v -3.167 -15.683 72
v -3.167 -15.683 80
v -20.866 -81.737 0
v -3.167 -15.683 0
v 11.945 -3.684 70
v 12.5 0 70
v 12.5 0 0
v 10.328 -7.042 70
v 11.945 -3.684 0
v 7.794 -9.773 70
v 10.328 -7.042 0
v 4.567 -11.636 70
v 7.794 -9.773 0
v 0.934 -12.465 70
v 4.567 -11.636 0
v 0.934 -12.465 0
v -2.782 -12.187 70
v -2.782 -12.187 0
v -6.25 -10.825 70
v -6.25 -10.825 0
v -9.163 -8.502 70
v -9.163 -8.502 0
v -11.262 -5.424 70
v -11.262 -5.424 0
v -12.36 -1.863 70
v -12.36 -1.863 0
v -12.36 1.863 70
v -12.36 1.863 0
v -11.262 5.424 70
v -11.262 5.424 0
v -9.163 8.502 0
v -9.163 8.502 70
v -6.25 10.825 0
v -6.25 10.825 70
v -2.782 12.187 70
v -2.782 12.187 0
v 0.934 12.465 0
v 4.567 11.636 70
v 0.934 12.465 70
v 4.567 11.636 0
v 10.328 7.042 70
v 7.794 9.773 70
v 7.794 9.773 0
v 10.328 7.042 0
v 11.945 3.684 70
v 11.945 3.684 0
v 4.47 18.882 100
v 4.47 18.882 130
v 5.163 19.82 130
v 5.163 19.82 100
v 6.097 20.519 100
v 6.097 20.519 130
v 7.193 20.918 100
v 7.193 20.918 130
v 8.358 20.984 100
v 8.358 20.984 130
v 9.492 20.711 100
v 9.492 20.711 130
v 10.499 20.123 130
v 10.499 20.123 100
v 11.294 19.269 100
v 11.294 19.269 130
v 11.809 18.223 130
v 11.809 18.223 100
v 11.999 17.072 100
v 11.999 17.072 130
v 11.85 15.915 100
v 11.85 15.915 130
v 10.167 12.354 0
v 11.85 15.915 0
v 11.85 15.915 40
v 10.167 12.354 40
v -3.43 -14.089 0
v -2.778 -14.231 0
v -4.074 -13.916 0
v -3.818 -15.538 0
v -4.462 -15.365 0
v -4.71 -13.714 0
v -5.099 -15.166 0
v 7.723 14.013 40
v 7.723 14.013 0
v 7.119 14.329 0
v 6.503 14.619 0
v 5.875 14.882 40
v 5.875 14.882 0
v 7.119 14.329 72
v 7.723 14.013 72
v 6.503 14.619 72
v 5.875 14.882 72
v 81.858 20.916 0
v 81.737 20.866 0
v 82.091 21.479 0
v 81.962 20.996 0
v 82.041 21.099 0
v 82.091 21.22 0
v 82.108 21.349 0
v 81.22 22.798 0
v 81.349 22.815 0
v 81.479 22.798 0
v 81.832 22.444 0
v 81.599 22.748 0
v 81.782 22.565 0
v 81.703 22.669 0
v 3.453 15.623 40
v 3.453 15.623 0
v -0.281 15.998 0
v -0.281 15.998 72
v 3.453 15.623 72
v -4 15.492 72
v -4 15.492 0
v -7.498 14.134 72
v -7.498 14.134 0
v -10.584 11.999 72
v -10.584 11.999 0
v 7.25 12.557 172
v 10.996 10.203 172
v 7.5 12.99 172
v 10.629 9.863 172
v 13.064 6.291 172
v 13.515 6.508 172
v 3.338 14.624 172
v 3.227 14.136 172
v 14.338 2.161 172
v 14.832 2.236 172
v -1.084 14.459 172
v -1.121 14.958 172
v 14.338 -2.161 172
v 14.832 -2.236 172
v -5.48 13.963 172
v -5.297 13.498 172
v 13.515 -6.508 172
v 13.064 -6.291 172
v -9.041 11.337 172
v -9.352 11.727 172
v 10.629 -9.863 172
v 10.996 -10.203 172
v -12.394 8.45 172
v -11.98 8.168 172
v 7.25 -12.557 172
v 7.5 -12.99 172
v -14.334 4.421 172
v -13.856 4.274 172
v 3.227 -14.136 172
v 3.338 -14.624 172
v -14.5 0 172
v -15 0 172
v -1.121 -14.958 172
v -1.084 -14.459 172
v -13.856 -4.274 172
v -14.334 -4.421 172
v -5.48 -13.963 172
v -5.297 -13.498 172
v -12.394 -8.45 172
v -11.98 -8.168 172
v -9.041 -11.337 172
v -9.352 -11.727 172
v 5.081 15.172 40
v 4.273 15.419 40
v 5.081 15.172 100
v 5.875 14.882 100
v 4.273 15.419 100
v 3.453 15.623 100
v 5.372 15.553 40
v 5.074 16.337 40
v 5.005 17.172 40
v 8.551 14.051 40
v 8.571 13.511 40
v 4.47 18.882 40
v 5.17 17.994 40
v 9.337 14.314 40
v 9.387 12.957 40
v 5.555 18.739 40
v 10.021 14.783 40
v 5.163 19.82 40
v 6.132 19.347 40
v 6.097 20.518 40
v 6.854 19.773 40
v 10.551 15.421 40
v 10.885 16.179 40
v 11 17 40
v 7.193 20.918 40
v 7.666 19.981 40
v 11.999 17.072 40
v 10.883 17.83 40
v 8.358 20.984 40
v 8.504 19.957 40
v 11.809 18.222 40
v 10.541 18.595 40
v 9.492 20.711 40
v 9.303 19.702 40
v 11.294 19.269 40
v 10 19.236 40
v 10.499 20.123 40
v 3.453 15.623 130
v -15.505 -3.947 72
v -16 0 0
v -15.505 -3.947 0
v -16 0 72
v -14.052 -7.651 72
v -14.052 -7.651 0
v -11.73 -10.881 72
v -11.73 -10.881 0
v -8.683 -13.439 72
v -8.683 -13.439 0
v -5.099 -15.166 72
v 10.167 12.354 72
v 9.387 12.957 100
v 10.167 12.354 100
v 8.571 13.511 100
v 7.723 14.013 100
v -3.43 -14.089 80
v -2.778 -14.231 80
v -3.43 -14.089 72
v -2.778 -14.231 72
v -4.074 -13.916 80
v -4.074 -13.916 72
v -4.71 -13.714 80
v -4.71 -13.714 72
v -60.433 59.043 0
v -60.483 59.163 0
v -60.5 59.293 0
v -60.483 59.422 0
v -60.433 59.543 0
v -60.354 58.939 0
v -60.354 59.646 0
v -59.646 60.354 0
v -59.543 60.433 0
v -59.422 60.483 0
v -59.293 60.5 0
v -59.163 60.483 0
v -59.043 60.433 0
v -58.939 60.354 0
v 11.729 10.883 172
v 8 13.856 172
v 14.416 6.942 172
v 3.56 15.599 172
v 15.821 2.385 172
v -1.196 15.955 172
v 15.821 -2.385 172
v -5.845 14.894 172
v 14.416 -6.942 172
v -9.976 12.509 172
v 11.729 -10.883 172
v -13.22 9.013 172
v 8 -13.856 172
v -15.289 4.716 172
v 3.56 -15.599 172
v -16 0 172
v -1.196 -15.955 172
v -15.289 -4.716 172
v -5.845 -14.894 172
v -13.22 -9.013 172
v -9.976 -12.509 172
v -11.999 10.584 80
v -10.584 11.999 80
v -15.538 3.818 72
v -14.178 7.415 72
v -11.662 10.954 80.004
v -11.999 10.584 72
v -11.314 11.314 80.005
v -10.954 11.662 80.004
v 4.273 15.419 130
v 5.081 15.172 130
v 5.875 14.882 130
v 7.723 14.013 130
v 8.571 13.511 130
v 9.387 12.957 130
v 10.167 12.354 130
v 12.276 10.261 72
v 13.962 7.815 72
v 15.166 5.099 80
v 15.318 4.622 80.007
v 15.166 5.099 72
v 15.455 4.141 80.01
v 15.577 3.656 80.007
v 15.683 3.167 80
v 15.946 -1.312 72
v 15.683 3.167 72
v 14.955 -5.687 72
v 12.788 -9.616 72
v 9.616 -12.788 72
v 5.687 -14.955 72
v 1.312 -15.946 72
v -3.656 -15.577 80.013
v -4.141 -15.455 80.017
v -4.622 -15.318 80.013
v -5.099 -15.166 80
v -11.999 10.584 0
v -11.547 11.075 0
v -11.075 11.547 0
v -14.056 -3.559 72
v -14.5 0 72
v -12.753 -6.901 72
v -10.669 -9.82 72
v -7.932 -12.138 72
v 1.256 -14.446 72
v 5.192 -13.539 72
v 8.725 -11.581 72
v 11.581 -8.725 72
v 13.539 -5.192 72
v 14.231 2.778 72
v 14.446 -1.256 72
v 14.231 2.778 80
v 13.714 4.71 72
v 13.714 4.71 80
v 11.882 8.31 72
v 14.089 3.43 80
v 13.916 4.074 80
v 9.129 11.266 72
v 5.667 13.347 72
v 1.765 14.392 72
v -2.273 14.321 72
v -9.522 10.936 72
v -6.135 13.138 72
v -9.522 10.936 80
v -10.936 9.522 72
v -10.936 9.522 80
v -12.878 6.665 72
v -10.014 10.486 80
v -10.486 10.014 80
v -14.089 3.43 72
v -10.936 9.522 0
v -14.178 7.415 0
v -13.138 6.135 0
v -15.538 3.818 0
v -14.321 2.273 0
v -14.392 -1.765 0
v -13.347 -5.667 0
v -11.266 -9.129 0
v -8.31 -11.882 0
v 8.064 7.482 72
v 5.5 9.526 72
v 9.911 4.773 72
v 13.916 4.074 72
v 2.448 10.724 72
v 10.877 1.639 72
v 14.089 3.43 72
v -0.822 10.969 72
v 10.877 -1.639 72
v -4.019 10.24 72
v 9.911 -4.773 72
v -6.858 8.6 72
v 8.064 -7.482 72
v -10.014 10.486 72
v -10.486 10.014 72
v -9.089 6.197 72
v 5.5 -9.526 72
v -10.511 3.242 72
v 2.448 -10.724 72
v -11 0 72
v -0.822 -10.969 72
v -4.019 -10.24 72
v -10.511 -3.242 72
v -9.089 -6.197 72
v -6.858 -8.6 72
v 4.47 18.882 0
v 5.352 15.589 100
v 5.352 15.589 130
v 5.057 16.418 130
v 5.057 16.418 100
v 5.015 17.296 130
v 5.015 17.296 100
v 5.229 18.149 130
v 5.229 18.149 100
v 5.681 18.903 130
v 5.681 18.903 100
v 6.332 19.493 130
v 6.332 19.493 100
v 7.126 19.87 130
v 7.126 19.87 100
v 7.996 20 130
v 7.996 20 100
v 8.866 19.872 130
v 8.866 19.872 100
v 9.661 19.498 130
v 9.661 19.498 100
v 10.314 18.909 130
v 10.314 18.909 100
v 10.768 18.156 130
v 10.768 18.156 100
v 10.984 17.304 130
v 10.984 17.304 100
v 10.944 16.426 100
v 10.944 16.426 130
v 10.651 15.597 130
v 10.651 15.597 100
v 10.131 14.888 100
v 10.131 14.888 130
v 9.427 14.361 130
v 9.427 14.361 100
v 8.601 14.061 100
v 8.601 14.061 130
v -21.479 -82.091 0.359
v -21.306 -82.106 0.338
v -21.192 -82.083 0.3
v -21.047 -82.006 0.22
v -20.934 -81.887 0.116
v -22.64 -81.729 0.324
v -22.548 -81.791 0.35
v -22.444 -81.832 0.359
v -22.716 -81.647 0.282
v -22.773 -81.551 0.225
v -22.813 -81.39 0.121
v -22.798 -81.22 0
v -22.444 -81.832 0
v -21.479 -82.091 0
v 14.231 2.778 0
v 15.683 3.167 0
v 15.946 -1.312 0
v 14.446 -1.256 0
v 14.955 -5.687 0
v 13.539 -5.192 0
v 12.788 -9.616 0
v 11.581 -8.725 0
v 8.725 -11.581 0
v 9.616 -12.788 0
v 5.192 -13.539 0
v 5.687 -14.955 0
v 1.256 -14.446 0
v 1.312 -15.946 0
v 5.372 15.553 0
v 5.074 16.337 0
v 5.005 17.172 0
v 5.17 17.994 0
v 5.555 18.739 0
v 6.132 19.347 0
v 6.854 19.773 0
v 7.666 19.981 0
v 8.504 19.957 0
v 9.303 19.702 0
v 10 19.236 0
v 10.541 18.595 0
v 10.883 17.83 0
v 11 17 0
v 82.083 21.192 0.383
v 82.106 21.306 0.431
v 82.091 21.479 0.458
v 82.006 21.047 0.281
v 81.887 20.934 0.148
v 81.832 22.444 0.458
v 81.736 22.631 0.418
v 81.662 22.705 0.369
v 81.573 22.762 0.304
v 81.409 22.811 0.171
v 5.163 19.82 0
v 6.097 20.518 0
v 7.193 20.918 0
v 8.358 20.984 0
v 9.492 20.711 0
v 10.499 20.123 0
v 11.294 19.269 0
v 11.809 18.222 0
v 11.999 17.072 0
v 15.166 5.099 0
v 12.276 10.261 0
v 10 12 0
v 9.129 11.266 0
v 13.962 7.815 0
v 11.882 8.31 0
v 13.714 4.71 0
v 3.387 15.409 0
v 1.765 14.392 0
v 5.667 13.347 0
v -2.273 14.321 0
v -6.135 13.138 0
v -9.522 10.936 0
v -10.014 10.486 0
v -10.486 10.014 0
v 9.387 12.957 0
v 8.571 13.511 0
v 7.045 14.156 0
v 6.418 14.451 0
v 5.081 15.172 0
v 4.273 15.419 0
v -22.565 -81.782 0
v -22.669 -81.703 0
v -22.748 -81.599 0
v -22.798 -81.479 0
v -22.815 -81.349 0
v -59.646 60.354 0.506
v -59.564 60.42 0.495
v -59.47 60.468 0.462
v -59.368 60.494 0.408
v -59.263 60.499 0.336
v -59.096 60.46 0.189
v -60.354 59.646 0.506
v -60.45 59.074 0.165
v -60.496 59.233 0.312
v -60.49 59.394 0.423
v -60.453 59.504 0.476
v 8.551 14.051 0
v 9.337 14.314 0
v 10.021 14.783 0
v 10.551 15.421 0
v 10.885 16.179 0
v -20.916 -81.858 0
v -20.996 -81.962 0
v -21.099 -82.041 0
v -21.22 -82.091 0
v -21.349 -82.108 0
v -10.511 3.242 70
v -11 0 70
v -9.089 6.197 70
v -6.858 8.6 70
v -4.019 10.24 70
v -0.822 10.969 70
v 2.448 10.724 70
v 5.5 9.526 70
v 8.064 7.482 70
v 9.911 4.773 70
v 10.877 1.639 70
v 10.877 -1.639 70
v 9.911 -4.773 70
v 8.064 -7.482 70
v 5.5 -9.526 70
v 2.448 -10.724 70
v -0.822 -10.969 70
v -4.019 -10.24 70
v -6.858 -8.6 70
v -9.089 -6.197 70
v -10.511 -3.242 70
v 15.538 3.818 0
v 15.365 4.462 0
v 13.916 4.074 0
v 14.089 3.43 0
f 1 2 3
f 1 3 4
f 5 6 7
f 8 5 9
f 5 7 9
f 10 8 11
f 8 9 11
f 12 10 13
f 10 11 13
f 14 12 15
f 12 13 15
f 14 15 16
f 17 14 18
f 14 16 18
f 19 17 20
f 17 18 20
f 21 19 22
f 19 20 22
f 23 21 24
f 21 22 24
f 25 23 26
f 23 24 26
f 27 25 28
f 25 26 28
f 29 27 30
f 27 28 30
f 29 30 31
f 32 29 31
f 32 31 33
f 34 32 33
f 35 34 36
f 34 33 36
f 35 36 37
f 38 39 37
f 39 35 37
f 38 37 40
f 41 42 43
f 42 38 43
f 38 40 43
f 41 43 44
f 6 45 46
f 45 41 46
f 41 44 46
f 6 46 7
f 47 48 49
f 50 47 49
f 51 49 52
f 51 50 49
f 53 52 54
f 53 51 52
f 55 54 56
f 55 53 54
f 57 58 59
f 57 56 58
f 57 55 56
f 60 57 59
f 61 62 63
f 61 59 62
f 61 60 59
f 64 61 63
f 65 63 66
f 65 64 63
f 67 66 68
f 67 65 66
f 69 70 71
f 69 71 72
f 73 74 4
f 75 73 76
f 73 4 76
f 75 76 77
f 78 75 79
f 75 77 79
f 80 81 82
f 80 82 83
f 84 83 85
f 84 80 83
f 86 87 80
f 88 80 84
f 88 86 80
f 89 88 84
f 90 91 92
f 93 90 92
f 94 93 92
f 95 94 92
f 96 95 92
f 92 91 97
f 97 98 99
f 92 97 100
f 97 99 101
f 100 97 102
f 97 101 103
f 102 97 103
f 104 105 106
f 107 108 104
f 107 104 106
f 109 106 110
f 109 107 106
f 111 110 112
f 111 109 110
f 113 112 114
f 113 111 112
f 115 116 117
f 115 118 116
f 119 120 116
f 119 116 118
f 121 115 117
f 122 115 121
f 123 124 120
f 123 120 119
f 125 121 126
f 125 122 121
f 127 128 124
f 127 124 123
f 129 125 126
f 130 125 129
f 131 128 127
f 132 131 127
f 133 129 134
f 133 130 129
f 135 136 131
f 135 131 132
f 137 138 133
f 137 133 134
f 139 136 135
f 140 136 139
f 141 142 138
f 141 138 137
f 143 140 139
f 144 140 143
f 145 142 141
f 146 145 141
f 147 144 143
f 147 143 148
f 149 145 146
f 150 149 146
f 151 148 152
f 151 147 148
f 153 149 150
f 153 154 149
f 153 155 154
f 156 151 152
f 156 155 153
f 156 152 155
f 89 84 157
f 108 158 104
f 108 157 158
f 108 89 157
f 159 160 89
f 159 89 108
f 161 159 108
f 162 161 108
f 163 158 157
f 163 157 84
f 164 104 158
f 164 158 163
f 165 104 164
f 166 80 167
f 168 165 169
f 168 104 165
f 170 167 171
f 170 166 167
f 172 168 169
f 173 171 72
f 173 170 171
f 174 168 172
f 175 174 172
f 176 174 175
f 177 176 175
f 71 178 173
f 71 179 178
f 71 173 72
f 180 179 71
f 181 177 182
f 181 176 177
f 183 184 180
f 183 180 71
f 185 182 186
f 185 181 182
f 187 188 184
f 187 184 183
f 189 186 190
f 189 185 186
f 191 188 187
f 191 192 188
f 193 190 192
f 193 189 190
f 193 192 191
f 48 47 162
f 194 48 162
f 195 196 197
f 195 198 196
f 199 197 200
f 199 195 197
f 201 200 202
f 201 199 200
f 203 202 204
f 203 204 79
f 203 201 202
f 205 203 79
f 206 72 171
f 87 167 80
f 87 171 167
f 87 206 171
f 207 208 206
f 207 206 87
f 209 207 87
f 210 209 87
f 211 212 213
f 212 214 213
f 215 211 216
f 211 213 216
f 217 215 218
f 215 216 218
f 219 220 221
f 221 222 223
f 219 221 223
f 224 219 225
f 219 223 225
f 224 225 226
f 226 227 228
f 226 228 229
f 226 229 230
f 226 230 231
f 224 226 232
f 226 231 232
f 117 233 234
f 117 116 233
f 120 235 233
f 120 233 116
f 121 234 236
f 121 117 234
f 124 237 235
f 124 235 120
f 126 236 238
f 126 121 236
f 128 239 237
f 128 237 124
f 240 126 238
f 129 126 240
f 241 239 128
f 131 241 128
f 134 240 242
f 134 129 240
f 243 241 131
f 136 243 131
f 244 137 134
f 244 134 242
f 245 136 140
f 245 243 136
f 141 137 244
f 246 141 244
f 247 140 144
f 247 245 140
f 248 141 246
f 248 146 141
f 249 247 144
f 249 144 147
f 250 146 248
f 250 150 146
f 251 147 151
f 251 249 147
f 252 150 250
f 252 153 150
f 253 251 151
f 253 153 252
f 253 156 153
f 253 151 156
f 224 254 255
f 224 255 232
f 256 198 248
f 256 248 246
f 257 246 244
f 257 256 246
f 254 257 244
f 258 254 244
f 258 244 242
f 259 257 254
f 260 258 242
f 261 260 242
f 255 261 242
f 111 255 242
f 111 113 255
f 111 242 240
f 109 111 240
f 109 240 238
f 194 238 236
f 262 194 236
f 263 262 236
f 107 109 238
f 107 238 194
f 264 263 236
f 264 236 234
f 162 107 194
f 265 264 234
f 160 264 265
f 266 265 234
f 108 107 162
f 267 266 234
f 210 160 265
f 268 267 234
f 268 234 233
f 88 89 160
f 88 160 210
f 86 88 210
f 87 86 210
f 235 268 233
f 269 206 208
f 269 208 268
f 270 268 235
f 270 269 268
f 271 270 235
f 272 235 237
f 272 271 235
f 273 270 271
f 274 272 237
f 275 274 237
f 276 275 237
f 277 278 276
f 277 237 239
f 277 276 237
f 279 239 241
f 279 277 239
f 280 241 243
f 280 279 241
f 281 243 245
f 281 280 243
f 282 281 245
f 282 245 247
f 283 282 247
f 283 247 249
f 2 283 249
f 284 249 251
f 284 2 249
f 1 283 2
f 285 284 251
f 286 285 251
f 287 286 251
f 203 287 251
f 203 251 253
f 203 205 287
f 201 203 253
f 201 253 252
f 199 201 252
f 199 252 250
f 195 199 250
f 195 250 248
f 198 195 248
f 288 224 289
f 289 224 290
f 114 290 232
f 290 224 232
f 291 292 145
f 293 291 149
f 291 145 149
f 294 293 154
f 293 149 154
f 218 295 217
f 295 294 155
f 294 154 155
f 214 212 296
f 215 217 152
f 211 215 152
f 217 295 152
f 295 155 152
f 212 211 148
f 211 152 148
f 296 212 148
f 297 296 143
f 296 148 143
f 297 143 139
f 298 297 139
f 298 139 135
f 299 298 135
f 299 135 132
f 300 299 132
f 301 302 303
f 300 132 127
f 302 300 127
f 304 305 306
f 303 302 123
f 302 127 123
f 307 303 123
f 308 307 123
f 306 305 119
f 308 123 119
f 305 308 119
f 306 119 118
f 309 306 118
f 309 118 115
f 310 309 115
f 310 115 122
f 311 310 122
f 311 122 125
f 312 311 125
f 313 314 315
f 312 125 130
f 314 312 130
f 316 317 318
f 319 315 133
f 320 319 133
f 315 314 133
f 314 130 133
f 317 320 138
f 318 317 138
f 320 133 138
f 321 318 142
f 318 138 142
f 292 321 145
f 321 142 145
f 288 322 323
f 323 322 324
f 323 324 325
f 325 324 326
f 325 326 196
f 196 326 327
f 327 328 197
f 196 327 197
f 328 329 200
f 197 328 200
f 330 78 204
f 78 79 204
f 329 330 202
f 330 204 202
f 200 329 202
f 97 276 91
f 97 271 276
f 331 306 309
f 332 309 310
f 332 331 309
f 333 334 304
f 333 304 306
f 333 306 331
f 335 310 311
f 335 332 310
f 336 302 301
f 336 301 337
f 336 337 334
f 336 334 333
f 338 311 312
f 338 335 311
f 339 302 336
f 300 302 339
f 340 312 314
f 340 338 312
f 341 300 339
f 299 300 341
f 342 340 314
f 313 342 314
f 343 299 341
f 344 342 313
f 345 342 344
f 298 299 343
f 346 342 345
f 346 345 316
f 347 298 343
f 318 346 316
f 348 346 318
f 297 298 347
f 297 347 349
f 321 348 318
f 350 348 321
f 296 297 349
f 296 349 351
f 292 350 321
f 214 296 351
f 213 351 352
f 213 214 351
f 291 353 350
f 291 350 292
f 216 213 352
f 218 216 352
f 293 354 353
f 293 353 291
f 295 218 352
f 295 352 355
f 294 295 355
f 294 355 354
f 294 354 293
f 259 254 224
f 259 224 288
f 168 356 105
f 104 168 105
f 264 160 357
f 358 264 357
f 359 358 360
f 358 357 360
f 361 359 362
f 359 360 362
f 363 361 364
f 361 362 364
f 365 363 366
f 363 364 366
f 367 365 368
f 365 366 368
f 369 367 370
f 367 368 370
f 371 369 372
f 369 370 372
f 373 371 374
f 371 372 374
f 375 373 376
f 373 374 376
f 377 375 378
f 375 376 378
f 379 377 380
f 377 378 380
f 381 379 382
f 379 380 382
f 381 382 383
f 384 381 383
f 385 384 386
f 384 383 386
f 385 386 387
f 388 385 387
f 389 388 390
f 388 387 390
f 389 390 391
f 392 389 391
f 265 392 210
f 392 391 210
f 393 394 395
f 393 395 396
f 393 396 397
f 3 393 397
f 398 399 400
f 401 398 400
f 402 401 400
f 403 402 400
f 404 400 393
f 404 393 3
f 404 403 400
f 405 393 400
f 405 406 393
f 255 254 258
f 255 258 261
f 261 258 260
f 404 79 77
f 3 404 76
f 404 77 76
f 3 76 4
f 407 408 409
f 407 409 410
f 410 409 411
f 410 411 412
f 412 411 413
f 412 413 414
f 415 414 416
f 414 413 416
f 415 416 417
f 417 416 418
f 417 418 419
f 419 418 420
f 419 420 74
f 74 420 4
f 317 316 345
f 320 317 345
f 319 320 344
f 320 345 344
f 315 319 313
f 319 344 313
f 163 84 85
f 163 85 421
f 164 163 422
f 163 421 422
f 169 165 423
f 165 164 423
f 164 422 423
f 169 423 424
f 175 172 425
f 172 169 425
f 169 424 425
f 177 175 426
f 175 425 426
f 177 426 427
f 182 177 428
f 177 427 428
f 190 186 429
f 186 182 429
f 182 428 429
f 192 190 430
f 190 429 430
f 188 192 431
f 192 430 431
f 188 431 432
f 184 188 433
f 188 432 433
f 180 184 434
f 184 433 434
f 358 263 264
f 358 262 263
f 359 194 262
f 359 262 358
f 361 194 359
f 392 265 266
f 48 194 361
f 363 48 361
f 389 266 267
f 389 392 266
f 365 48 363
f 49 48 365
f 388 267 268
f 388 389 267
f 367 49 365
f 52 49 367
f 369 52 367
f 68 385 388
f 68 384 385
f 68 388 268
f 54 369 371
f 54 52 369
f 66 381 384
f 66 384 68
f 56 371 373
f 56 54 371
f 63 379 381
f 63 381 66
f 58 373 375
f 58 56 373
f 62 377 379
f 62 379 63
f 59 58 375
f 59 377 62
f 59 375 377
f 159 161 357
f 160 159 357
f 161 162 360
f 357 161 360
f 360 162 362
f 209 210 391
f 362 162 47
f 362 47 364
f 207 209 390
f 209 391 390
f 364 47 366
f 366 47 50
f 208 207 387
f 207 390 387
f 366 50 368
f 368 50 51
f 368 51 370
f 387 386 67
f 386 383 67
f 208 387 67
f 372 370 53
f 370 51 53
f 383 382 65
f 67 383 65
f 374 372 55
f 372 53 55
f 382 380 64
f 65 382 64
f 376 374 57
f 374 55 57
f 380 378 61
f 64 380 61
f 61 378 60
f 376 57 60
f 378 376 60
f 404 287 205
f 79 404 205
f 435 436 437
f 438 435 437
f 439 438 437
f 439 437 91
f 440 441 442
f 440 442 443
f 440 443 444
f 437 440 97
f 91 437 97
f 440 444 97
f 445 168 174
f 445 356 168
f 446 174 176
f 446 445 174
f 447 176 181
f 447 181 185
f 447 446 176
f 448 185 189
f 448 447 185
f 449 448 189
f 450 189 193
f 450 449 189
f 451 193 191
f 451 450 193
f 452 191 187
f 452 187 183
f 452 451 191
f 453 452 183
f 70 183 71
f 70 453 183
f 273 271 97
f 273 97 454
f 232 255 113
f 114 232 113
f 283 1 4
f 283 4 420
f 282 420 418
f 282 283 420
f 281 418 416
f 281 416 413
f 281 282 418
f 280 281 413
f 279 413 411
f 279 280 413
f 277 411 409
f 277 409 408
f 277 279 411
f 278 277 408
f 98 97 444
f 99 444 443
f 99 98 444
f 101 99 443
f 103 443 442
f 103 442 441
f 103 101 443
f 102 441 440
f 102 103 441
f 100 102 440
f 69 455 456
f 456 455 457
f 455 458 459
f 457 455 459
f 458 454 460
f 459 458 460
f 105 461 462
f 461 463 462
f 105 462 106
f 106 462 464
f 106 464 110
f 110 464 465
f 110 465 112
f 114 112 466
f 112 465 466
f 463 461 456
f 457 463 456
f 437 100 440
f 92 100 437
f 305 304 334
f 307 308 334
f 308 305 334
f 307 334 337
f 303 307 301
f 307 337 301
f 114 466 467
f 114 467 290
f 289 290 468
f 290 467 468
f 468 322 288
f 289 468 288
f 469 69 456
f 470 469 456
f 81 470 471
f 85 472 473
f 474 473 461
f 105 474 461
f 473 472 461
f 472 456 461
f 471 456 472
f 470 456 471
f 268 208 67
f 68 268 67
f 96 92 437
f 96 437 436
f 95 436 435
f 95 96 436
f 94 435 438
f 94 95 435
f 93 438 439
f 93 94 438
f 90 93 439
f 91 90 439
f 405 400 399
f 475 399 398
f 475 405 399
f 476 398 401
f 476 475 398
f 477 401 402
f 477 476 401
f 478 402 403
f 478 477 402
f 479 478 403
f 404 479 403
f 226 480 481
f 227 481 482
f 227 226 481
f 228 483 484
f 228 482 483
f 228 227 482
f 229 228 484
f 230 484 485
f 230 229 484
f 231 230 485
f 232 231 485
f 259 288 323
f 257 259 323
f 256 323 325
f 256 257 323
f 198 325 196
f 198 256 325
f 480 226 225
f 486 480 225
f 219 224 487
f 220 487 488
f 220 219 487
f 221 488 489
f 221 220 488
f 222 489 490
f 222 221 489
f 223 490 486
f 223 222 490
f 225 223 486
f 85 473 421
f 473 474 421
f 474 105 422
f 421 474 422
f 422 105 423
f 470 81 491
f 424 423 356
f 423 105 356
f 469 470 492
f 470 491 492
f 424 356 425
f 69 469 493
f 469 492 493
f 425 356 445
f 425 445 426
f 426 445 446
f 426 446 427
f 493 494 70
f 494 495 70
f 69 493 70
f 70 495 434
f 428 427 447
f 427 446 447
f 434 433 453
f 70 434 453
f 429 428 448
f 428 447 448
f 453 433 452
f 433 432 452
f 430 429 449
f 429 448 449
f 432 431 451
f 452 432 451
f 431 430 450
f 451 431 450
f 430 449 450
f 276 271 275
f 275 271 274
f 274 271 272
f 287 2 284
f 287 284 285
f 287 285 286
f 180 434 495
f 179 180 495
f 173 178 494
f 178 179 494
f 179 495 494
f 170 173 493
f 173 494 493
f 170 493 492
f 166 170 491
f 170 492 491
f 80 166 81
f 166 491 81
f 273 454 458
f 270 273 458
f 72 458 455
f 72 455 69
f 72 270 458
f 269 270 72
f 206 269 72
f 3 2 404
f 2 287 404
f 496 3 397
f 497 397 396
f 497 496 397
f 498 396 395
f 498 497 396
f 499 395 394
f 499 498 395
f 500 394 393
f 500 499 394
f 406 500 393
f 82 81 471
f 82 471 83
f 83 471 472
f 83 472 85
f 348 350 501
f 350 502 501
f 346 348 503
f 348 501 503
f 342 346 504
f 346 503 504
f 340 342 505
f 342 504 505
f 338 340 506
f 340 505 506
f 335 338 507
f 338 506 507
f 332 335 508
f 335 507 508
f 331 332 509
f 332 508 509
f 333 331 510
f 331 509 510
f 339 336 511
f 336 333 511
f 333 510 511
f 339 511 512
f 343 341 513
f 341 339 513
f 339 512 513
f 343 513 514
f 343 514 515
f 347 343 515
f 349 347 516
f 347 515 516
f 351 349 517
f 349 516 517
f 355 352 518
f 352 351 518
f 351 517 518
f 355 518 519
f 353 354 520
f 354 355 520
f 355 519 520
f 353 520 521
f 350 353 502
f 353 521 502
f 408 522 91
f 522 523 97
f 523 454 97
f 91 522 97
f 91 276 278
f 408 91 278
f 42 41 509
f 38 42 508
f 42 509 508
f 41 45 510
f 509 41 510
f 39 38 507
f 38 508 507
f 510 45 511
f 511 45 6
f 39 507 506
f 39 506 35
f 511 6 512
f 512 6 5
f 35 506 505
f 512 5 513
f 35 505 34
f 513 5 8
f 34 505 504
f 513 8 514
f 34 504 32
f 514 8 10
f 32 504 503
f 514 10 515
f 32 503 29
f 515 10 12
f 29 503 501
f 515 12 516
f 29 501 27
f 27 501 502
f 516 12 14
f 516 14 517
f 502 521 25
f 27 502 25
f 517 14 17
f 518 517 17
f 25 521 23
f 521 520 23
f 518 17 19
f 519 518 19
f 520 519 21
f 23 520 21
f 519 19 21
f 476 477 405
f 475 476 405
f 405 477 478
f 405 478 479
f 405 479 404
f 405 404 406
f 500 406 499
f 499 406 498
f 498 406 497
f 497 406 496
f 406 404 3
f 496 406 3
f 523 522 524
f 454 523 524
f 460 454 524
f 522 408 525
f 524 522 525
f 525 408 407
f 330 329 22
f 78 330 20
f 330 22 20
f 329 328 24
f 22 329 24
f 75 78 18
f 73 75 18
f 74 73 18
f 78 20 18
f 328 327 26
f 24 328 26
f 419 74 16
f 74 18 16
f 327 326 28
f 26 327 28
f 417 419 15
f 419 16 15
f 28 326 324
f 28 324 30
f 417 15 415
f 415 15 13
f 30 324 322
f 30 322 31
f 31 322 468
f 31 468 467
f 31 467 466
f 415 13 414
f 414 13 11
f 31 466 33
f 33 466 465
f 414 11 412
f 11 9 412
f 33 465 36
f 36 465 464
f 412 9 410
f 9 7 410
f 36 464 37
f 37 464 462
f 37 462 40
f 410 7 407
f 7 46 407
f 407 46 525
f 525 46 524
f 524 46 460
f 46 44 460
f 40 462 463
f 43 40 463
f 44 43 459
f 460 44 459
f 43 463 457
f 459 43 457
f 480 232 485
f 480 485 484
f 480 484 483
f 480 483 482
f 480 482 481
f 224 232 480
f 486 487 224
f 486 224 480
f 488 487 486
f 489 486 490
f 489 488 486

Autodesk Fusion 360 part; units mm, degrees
sketch "Sketch1" plane through (0, 0, 0) normal (0, 0, 1) x (1, 0, 0)
  circle A0 centre (0, 0) radius 12.5
  circle A1 centre (0, 0) radius 14.5
  line L0 (-110, 110) -> (110, 110)
  line L1 (110, 110) -> (110, -110)
  line L2 (110, -110) -> (-110, -110)
  line L3 (-110, -110) -> (-110, 110)
  line L4 (-110, 110) -> (110, -110) construction
  line L5 (110, 110) -> (-110, -110) construction
  line L6 (-60, 60) -> (-60.3536, 59.6464)
  line L7 (-60.7071, 59.2929) -> (-59.6464, 60.3536)
  line L8 (-58.9393, 60.3536) -> (0.7071, 0.7071)
  line L9 (-60.3536, 58.9393) -> (-0.7071, -0.7071)
  arc A2 (-58.9393, 60.3536) -> (-59.6464, 60.3536) centre (-59.2929, 60) ccw
  arc A3 (-60.3536, 59.6464) -> (-60.3536, 58.9393) centre (-60, 59.2929) ccw
  line L10 (-20.9956, -82.2203) -> (-22.4445, -81.8321)
  arc A4 (-21.4786, -82.0909) -> (-20.8662, -81.7374) centre (-21.3492, -81.608) ccw
  line L11 (-20.8662, -81.7374) -> (0.9659, -0.2588)
  arc A5 (-22.798, -81.2197) -> (-22.4445, -81.8321) centre (-22.3151, -81.3492) ccw
  line L12 (-22.798, -81.2197) -> (-0.9659, 0.2588)
  line L13 (81.7027, 22.9275) -> (82.0909, 21.4786)
  arc A6 (81.8321, 22.4445) -> (81.2197, 22.798) centre (81.3492, 22.3151) ccw
  line L14 (81.2197, 22.798) -> (-0.2588, 0.9659)
  arc A7 (81.7374, 20.8662) -> (82.0909, 21.4786) centre (81.608, 21.3492) ccw
  line L15 (81.7374, 20.8662) -> (0.2588, -0.9659)
  point P0 (-59.2929, 60.7071)
  dimension "d1" = 25
  dimension "d2" = 29
  dimension "d3" = 220
  dimension "d4" = 220
  dimension "d5" = 1
  dimension "d6" = 2
  dimension "d7" = 180
  dimension "d8" = 0.5
  dimension "d10" = 360
extrude "Extrude1" add sketch "Sketch1" along normal blind 70 contours A0 A1 L11 L15 | A0 A1 L14 L15 | A0 A1 L11 L12 | A0 A1 L8 L14 | A0 A1 L9 L12 | A0 A1 L8 L9 makes body 1
sketch "Sketch2" plane through (0, 0, 70) normal (0, 0, 1) x (-1, 0, 0)
  circle A0 centre (0, 0) radius 12.5
  circle A1 centre (0, 0) radius 14.5
  circle A2 centre (0, 0) radius 11
  dimension "d13" = 22
extrude "Extrude2" add sketch "Sketch2" along normal blind 2 contours A0 | A1 bodies 1
sketch "Sketch3" plane through (0, 0, 72) normal (0, 0, 1) x (-1, 0, 0)
  circle A0 centre (0, 0) radius 11
  circle A1 centre (0, 0) radius 14.5
  circle A2 centre (0, 0) radius 13.5
  circle A3 centre (0, 0) radius 15
  circle A4 centre (0, 0) radius 16
  dimension "d16" = 27
  dimension "d17" = 30
  dimension "d18" = 32
extrude "Extrude3" add sketch "Sketch3" along normal blind 100 separate body contours A4 makes body 2
extrude "Extrude4" add sketch "Sketch3" against normal blind 72 contours A3 | A4 bodies 1 2
extrude "Extrude5" add sketch "Sketch1" along normal blind 80 contours A1 L13 A6 L14 A7 L15 | A1 L10 A4 L11 A5 L12 | A1 L6 L7 L8 L9 A2 A3 bodies 1
sketch "Sketch4" plane through (-0.9659, 0.2588, 0) normal (-0.9659, 0.2588, 0) x (-0.2588, -0.9659, 0)
  line L0 (15.9687, 80) -> (15.9687, 0)
  line L1 (15.9687, 0) -> (84.3528, 0)
  line L2 (84.3528, 0) -> (84.3528, 80)
  line L3 (84.3528, 80) -> (15.9687, 80)
  line L4 (15.9687, 80) -> (84.3528, 0)
  line L5 (15.9687, 80) -> (86.3566, 117.9716)
  line L6 (86.3566, 117.9716) -> (140, 40)
  line L7 (140, 40) -> (84.3528, 0)
extrude "Extrude6" cut sketch "Sketch4" against normal blind 50 contours L2 L3 L5 L6 L7 | L2 L3 L4 bodies 1
sketch "Sketch5" plane through (-0.7071, -0.7071, 0) normal (-0.7071, -0.7071, 0) x (0.7071, -0.7071, 0)
  line L0 (-15.9687, 0) -> (-15.9687, 80)
  line L1 (-15.9687, 80) -> (-84.3528, 80)
  line L2 (-84.3528, 80) -> (-84.3528, 0)
  line L3 (-84.3528, 0) -> (-15.9687, 0)
  line L4 (-15.9687, 80) -> (-84.3528, 0)
  line L5 (-84.3528, 0) -> (-114.2811, 30.3018)
  line L6 (-114.2811, 30.3018) -> (-99.317, 93.7517)
  line L7 (-99.317, 93.7517) -> (-15.9687, 80)
extrude "Extrude7" cut sketch "Sketch5" against normal blind 5 contours L1 L2 L4 | L1 L2 L5 L6 L7 bodies 1
sketch "Sketch6" plane through (-0.2588, 0.9659, 0) normal (-0.2588, 0.9659, 0) x (-0.9659, -0.2588, 0)
  line L0 (-15.9687, 0) -> (-15.9687, 80)
  line L1 (-15.9687, 80) -> (-84.3528, 80)
  line L2 (-84.3528, 80) -> (-84.3528, 0)
  line L3 (-84.3528, 0) -> (-15.9687, 0)
  line L4 (-15.9687, 80) -> (-84.3528, 0)
  line L5 (-135.6724, 47.0573) -> (-84.3528, 0)
  line L6 (-135.6724, 47.0573) -> (-95.0226, 105.2424)
  line L7 (-95.0226, 105.2424) -> (-15.9687, 80)
extrude "Extrude8" cut sketch "Sketch6" against normal blind 5 contours L1 L2 L4 | L1 L2 L5 L6 L7 bodies 1
sketch "Sketch7" plane through (0, 0, 0) normal (0, 0, 1) x (1, 0, 0)
  circle A0 centre (8, 17) radius 3
  circle A1 centre (8, 17) radius 4
  line L0 (4.4701, 18.8815) -> (3.3866, 15.4092)
  line L1 (11.85, 15.9148) -> (10, 12)
  line L2 (3.3866, 15.4092) -> (10, 12)
  dimension "d31" = 6
  dimension "d32" = 1
extrude "Extrude9" add sketch "Sketch7" along normal blind 100 contours A1 L0 L1 L2 | A1 L0 L2 | A1 L1 L2 bodies 1
sketch "Sketch8" plane through (0, 0, 172) normal (0, 0, 1) x (-1, 0, 0)
  circle A0 centre (0, 0) radius 15
  circle A1 centre (0, 0) radius 16
  circle A2 centre (0, 0) radius 14.5
  dimension "d35" = 29
extrude "Extrude10" add sketch "Sketch8" against normal blind 100 contours A0 bodies 1
extrude "Extrude11" cut 1 faces at (10.8115, 14.4974, 100) along direction (0, 0, -1) blind 60 on bodies 1 bodies 1
ref_plane "WorkPlane1" through (8.1388, 17.2026, 100) normal (0, 0, 1) x (1, 0, 0)
sketch "Sketch9" plane through (8.1388, 17.2026, 100) normal (0, 0, 1) x (1, 0, 0)
  arc A0 (2.0285, -4.8484) -> (-0.4161, -3.1897) centre (-8.1388, -17.2026) ccw
  line L0 (2.0285, -4.8484) -> (3.7112, -1.2877)
  arc A1 (3.7112, -1.2877) -> (-3.6687, 1.679) centre (-0.1388, -0.2026) ccw
  line L1 (-3.6687, 1.679) -> (-4.6855, -1.5797)
  arc A2 (-2.2638, -2.3202) -> (-4.6855, -1.5797) centre (-8.1388, -17.2026) ccw
  arc A3 (-0.4161, -3.1897) -> (-2.2638, -2.3202) centre (-0.1388, -0.2026) ccw
extrude "Extrude12" add sketch "Sketch9" along normal blind 30 bodies 1
